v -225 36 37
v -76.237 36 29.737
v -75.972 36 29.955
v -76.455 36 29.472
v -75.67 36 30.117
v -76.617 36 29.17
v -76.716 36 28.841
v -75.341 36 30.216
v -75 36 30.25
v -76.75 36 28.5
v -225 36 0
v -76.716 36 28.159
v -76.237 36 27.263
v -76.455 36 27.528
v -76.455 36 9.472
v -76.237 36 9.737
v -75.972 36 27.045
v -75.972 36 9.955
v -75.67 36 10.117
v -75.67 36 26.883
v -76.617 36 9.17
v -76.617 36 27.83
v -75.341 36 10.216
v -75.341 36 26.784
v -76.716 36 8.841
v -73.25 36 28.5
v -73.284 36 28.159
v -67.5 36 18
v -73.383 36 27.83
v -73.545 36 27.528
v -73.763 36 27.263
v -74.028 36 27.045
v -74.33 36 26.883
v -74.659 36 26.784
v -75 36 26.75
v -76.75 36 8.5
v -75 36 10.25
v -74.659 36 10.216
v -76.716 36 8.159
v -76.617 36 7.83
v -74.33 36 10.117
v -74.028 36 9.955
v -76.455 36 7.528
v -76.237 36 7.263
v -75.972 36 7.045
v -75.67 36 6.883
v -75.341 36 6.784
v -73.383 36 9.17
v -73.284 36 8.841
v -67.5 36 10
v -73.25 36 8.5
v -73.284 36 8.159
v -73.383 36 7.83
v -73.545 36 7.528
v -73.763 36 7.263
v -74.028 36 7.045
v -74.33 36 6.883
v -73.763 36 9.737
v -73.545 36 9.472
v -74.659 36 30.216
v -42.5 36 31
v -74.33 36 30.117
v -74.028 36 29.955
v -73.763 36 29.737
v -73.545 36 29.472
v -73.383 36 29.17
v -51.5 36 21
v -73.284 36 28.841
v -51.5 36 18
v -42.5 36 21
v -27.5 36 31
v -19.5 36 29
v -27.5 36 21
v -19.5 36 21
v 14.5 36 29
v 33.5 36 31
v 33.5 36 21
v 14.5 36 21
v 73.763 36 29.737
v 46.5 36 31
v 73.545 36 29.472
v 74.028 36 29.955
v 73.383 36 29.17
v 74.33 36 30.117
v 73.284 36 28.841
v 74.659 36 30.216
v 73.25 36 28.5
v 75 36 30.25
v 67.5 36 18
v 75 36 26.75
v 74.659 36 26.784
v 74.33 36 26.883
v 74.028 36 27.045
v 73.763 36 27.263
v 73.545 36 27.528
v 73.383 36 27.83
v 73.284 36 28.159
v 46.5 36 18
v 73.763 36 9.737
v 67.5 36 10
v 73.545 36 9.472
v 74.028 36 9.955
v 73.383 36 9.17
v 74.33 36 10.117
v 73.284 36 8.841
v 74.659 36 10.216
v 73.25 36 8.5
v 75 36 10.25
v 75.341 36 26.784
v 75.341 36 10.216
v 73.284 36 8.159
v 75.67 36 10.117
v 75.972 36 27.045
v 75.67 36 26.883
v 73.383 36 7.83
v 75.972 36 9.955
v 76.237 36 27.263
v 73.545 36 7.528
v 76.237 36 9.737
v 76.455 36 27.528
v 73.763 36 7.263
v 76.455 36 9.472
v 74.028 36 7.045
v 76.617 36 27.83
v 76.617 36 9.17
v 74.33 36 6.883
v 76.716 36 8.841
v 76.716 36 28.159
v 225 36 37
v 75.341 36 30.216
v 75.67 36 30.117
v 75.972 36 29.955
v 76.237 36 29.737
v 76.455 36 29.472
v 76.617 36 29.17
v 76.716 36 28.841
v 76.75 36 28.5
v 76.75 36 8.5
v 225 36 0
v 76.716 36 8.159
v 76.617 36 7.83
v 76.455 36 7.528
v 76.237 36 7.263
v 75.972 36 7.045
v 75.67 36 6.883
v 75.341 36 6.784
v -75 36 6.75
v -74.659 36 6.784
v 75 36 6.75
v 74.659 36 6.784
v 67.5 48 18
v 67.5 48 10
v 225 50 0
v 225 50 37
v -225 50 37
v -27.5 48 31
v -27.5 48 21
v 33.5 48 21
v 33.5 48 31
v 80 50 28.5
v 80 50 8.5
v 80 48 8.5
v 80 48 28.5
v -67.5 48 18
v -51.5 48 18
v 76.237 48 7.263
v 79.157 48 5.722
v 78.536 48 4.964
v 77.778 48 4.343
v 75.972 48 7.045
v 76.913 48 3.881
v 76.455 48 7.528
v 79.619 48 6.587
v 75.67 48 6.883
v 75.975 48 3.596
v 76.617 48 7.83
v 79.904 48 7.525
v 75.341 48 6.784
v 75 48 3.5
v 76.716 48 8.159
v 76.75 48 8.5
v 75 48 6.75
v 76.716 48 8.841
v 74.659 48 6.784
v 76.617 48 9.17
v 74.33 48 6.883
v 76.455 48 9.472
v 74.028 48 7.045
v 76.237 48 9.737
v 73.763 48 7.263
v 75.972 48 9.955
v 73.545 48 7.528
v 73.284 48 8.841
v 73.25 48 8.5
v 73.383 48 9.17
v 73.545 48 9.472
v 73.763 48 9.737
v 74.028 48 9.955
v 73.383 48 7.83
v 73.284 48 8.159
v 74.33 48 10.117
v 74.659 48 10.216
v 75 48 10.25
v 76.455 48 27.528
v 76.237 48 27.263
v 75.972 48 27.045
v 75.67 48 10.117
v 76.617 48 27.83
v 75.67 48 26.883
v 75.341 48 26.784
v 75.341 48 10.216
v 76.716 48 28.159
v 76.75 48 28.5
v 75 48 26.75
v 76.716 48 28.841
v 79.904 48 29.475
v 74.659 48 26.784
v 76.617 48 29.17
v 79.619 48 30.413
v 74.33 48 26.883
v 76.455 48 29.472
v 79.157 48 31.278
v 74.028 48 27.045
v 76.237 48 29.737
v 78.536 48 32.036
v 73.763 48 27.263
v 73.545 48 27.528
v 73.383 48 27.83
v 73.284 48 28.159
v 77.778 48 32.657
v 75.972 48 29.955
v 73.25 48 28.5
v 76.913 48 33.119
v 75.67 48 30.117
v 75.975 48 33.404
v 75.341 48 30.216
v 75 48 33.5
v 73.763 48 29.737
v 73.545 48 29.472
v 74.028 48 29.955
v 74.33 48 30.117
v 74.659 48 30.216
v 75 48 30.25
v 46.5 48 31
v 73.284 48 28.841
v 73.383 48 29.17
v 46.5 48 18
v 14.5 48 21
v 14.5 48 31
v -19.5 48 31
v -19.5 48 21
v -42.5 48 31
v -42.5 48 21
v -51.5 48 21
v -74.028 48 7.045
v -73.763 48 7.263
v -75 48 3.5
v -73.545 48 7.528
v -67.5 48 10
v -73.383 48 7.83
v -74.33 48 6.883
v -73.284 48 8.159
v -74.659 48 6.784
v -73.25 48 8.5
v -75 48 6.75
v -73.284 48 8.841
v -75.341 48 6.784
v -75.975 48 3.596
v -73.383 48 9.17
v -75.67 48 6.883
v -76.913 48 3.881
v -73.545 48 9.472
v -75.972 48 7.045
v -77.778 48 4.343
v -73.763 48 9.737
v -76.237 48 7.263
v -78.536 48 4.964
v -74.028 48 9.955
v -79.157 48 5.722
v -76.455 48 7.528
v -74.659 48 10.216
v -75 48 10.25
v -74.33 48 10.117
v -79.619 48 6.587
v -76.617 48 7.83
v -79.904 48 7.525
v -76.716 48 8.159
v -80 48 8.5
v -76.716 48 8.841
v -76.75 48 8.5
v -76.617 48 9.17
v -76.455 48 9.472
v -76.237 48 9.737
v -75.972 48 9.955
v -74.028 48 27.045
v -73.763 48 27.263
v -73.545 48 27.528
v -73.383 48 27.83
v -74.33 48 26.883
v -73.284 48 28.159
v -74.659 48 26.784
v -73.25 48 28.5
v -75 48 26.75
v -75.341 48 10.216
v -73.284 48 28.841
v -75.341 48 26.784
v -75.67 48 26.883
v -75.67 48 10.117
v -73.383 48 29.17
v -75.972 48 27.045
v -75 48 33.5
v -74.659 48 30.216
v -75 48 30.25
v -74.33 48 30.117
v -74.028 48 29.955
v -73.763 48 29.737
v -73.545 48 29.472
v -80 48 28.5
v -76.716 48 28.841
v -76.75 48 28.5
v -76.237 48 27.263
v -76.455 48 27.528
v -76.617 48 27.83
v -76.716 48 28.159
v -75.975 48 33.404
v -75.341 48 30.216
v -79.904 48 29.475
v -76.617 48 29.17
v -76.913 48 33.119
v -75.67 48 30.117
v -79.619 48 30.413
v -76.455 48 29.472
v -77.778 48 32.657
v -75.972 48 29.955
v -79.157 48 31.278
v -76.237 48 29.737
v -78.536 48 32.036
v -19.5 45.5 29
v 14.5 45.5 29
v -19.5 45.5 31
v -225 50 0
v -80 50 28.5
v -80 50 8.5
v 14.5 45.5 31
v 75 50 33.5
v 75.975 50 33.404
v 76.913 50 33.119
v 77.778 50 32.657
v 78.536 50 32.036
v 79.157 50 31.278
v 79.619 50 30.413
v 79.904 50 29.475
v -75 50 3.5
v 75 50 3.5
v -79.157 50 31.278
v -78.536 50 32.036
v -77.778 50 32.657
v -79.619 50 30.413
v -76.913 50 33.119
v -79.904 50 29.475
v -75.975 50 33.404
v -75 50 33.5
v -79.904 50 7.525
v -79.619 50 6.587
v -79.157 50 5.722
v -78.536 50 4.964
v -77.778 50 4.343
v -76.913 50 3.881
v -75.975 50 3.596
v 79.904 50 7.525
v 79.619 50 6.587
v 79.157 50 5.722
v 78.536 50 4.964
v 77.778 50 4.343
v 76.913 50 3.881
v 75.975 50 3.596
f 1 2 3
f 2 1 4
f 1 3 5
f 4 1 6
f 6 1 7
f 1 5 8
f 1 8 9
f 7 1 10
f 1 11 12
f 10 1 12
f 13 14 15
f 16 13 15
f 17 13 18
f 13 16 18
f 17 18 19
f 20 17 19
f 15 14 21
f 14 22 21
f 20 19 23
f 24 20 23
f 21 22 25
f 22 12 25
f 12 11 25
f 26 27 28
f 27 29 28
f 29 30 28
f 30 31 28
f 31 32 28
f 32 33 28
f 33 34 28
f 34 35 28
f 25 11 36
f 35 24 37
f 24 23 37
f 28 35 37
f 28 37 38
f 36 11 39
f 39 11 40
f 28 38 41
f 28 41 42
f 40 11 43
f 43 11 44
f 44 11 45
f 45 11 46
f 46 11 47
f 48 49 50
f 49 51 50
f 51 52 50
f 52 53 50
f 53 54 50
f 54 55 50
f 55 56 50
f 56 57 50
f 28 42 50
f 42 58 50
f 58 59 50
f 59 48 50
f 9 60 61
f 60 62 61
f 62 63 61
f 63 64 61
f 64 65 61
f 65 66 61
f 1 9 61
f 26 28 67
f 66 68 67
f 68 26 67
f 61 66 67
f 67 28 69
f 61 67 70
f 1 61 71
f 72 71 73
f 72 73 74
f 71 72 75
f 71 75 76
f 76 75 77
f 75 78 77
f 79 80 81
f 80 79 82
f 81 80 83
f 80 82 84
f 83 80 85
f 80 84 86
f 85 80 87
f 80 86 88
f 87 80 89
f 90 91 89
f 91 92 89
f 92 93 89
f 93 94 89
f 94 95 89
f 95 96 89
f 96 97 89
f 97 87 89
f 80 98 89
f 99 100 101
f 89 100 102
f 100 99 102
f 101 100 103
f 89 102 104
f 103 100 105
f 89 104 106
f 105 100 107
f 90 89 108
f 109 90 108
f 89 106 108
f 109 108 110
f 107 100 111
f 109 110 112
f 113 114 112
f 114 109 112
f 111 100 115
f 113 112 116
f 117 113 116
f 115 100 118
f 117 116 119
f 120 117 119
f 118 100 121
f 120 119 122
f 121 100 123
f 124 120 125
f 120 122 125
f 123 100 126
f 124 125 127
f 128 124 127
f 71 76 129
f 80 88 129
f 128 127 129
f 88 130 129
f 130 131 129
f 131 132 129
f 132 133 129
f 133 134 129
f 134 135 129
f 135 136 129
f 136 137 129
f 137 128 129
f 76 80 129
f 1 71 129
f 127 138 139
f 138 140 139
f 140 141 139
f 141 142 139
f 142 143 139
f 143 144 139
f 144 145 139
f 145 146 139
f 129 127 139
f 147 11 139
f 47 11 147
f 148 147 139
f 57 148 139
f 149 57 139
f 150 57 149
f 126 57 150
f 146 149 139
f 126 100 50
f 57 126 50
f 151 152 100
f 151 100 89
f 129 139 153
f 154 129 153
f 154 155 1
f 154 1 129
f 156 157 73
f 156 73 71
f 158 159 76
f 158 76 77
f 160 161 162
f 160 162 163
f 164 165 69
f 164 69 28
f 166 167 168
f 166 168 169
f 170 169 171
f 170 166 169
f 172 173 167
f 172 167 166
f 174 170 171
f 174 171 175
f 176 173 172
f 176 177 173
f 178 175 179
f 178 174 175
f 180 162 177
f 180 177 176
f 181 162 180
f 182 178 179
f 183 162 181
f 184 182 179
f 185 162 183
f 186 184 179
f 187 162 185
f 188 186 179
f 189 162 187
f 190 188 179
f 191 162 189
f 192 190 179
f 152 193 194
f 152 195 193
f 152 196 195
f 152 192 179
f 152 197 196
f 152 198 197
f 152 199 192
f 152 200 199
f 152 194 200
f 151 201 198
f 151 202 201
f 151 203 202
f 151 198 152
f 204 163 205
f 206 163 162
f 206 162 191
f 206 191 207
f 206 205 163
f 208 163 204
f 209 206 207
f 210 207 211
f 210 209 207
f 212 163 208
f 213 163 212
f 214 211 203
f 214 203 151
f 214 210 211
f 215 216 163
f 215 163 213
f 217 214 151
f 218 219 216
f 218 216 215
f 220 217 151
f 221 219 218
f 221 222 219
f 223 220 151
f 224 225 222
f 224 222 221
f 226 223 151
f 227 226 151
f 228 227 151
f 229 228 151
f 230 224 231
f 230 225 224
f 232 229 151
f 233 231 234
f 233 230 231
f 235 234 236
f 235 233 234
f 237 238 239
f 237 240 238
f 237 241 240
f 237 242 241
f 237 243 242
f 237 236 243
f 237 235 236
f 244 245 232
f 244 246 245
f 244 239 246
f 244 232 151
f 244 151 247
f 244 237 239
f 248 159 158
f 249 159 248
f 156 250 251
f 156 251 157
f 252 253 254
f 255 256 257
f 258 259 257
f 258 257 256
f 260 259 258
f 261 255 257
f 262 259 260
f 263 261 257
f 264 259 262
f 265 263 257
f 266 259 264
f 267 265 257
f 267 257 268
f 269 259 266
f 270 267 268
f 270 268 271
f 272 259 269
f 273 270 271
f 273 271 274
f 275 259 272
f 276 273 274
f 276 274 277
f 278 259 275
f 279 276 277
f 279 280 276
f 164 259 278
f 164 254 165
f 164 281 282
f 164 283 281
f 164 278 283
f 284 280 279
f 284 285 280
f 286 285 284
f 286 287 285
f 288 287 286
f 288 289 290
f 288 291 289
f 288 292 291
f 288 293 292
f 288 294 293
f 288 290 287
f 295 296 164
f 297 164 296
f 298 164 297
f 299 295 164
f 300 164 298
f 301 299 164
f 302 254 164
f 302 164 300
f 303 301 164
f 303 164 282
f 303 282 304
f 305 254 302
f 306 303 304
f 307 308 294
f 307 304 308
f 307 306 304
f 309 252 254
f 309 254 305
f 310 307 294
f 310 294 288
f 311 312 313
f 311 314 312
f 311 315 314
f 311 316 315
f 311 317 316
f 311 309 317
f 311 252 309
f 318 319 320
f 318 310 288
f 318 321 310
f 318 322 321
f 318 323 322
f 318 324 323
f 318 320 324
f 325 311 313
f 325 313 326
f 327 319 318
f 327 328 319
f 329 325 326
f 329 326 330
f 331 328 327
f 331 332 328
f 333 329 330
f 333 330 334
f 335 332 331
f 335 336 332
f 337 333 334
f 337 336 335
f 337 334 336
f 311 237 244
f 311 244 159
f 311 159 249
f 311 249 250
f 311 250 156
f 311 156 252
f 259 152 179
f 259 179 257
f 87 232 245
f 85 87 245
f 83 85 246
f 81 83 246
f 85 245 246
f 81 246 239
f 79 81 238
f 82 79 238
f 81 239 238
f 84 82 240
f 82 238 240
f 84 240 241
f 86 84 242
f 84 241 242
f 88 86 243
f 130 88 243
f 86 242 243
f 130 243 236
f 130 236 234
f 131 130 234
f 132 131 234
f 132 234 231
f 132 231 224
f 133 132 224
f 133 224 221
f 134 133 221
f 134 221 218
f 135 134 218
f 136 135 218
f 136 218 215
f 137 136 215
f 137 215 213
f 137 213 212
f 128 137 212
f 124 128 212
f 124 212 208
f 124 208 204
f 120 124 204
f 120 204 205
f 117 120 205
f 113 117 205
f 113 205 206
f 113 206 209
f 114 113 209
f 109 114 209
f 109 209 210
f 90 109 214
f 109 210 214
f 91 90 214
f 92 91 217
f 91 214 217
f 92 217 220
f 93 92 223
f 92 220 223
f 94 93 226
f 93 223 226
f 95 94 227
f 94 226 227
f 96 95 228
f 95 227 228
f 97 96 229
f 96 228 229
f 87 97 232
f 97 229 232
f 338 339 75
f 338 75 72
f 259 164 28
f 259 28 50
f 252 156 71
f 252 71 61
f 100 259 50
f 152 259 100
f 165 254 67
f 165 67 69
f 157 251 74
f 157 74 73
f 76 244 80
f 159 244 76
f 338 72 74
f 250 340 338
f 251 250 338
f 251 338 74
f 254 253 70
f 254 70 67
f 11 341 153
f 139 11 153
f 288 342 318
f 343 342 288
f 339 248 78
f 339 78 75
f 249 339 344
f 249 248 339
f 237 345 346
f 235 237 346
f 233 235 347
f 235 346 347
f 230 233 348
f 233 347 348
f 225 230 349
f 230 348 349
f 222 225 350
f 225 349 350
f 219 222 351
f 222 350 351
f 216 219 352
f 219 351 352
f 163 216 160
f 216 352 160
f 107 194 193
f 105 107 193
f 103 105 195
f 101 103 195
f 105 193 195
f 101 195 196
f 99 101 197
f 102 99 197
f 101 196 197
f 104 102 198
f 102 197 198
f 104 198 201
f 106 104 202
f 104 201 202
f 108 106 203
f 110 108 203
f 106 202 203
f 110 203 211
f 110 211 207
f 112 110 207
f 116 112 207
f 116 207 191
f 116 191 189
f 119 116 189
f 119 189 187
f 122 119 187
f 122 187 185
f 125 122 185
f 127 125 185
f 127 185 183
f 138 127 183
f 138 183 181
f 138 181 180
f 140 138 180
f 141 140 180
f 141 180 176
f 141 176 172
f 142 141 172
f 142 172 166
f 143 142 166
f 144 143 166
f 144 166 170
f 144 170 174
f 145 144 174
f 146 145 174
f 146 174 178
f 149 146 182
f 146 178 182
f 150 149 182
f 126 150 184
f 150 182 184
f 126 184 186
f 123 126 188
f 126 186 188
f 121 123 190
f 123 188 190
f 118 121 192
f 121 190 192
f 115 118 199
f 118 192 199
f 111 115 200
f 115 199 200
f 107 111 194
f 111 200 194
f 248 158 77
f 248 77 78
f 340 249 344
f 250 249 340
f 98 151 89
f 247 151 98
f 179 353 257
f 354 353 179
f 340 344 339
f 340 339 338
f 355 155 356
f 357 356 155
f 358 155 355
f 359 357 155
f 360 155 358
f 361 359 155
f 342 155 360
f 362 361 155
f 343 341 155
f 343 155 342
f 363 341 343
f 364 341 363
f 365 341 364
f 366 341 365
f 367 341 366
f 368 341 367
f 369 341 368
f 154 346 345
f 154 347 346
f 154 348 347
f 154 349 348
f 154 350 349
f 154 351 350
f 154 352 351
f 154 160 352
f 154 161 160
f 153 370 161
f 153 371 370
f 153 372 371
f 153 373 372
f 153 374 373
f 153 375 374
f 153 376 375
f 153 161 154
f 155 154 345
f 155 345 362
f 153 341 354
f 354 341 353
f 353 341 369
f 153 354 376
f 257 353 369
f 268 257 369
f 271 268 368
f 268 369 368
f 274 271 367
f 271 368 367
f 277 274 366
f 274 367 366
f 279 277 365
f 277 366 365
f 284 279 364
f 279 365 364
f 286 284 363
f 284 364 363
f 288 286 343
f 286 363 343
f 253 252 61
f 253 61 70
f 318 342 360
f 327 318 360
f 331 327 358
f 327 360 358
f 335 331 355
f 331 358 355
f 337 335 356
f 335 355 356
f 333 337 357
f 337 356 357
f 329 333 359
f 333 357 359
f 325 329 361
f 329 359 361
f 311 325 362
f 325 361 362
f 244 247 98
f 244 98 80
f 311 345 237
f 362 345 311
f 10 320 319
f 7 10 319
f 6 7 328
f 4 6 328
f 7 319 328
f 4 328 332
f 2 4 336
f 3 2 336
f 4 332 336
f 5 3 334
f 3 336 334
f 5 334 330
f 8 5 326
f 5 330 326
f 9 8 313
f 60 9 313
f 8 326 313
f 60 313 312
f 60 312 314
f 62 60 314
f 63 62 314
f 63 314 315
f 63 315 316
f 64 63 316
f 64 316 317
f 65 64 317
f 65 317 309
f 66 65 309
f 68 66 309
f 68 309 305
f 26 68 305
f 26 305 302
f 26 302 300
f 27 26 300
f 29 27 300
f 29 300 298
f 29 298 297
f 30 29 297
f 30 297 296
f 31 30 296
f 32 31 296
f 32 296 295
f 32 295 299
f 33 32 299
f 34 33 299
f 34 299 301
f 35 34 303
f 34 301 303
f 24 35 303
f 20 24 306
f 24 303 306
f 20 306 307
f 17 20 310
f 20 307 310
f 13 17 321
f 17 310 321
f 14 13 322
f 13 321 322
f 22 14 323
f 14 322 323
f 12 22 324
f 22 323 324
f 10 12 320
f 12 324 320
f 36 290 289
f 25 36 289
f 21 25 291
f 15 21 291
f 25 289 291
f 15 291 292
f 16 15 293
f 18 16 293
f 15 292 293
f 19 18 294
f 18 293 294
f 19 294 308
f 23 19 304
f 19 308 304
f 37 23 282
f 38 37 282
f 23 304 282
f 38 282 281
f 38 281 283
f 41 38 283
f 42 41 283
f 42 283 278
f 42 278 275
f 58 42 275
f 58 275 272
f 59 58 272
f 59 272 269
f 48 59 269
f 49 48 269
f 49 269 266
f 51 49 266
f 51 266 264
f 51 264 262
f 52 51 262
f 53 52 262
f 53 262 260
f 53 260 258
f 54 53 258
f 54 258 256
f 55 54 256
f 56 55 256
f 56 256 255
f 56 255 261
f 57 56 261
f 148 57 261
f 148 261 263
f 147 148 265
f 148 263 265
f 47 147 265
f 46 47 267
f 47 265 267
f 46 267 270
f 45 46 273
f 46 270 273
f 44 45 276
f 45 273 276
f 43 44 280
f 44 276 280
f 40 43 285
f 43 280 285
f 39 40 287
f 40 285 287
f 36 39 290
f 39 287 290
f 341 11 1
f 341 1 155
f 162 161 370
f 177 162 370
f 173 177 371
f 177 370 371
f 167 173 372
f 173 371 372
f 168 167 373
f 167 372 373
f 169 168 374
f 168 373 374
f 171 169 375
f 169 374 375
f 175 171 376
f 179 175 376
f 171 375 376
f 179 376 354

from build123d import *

# Parameters (mm, degrees)
SKETCH008_W          = 450
SKETCH008_H          = 14
PAD008_DEPTH         = 37
SKETCH015_R          = 1.75
POCKET007_DEPTH      = 14.001
POCKET007_DEPTH_BACK = 0.001
SKETCH016_W          = 34
SKETCH016_H          = 2
POCKET008_DEPTH      = 4.5
POCKET010_DEPTH      = 2


with BuildPart() as part:
    # Sketch008 → Pad008 (new body)
    with BuildSketch(Plane.XY):
        with Locations((0, 43)):
            Rectangle(SKETCH008_W, SKETCH008_H)
    extrude(amount=PAD008_DEPTH)

    # Sketch015 (on Face1 of Pad008) → Pocket007 (cut, two sides)
    with BuildSketch(Plane(origin=(0, 50, 0), x_dir=(-1, 0, 0), z_dir=(0, 1, 0))) as pocket007_sk:
        with Locations((-75, 28.5)):
            Circle(SKETCH015_R)
        with Locations((-75, 8.5)):
            Circle(SKETCH015_R)
        with Locations((75, 28.5)):
            Circle(SKETCH015_R)
        with Locations((75, 8.5)):
            Circle(SKETCH015_R)
        Polygon((-67.5, 18), (-46.5, 18), (-46.5, 31), (-33.5, 31), (-33.5, 21), (-14.5, 21), (-14.5, 29), (19.5, 29), (19.5, 21), (27.5, 21), (27.5, 31), (42.5, 31), (42.5, 21), (51.5, 21), (51.5, 18), (67.5, 18), (67.5, 10), (-67.5, 10), align=None)
    extrude(amount=-POCKET007_DEPTH, mode=Mode.SUBTRACT)
    extrude(pocket007_sk.sketch, amount=POCKET007_DEPTH_BACK, mode=Mode.SUBTRACT)

    # Sketch016 (on Face1 of Pocket007) → Pocket008 (cut)
    with BuildSketch(Plane(origin=(0, 50, 0), x_dir=(-1, 0, 0), z_dir=(0, 1, 0))):
        with Locations((2.5, 30)):
            Rectangle(SKETCH016_W, SKETCH016_H)
    extrude(amount=-POCKET008_DEPTH, mode=Mode.SUBTRACT)

    # Sketch019 (on Face1 of Pocket008) → Pocket010 (cut)
    with BuildSketch(Plane(origin=(0, 50, 0), x_dir=(-1, 0, 0), z_dir=(0, 1, 0))):
        with BuildLine():
            ThreePointArc((-75, 33.5), (-78.535534, 32.035534), (-80, 28.5))
            Line((-80, 8.5), (-80, 28.5))
            ThreePointArc((-80, 8.5), (-78.535534, 4.964466), (-75, 3.5))
            Line((75, 3.5), (-75, 3.5))
            ThreePointArc((75, 3.5), (78.535534, 4.964466), (80, 8.5))
            Line((80, 28.500023), (80, 8.5))
            ThreePointArc((80, 28.500023), (78.535526, 32.035542), (75, 33.5))
            Line((-75, 33.5), (75, 33.5))
        make_face()
    extrude(amount=-POCKET010_DEPTH, mode=Mode.SUBTRACT)


solid = part.part
